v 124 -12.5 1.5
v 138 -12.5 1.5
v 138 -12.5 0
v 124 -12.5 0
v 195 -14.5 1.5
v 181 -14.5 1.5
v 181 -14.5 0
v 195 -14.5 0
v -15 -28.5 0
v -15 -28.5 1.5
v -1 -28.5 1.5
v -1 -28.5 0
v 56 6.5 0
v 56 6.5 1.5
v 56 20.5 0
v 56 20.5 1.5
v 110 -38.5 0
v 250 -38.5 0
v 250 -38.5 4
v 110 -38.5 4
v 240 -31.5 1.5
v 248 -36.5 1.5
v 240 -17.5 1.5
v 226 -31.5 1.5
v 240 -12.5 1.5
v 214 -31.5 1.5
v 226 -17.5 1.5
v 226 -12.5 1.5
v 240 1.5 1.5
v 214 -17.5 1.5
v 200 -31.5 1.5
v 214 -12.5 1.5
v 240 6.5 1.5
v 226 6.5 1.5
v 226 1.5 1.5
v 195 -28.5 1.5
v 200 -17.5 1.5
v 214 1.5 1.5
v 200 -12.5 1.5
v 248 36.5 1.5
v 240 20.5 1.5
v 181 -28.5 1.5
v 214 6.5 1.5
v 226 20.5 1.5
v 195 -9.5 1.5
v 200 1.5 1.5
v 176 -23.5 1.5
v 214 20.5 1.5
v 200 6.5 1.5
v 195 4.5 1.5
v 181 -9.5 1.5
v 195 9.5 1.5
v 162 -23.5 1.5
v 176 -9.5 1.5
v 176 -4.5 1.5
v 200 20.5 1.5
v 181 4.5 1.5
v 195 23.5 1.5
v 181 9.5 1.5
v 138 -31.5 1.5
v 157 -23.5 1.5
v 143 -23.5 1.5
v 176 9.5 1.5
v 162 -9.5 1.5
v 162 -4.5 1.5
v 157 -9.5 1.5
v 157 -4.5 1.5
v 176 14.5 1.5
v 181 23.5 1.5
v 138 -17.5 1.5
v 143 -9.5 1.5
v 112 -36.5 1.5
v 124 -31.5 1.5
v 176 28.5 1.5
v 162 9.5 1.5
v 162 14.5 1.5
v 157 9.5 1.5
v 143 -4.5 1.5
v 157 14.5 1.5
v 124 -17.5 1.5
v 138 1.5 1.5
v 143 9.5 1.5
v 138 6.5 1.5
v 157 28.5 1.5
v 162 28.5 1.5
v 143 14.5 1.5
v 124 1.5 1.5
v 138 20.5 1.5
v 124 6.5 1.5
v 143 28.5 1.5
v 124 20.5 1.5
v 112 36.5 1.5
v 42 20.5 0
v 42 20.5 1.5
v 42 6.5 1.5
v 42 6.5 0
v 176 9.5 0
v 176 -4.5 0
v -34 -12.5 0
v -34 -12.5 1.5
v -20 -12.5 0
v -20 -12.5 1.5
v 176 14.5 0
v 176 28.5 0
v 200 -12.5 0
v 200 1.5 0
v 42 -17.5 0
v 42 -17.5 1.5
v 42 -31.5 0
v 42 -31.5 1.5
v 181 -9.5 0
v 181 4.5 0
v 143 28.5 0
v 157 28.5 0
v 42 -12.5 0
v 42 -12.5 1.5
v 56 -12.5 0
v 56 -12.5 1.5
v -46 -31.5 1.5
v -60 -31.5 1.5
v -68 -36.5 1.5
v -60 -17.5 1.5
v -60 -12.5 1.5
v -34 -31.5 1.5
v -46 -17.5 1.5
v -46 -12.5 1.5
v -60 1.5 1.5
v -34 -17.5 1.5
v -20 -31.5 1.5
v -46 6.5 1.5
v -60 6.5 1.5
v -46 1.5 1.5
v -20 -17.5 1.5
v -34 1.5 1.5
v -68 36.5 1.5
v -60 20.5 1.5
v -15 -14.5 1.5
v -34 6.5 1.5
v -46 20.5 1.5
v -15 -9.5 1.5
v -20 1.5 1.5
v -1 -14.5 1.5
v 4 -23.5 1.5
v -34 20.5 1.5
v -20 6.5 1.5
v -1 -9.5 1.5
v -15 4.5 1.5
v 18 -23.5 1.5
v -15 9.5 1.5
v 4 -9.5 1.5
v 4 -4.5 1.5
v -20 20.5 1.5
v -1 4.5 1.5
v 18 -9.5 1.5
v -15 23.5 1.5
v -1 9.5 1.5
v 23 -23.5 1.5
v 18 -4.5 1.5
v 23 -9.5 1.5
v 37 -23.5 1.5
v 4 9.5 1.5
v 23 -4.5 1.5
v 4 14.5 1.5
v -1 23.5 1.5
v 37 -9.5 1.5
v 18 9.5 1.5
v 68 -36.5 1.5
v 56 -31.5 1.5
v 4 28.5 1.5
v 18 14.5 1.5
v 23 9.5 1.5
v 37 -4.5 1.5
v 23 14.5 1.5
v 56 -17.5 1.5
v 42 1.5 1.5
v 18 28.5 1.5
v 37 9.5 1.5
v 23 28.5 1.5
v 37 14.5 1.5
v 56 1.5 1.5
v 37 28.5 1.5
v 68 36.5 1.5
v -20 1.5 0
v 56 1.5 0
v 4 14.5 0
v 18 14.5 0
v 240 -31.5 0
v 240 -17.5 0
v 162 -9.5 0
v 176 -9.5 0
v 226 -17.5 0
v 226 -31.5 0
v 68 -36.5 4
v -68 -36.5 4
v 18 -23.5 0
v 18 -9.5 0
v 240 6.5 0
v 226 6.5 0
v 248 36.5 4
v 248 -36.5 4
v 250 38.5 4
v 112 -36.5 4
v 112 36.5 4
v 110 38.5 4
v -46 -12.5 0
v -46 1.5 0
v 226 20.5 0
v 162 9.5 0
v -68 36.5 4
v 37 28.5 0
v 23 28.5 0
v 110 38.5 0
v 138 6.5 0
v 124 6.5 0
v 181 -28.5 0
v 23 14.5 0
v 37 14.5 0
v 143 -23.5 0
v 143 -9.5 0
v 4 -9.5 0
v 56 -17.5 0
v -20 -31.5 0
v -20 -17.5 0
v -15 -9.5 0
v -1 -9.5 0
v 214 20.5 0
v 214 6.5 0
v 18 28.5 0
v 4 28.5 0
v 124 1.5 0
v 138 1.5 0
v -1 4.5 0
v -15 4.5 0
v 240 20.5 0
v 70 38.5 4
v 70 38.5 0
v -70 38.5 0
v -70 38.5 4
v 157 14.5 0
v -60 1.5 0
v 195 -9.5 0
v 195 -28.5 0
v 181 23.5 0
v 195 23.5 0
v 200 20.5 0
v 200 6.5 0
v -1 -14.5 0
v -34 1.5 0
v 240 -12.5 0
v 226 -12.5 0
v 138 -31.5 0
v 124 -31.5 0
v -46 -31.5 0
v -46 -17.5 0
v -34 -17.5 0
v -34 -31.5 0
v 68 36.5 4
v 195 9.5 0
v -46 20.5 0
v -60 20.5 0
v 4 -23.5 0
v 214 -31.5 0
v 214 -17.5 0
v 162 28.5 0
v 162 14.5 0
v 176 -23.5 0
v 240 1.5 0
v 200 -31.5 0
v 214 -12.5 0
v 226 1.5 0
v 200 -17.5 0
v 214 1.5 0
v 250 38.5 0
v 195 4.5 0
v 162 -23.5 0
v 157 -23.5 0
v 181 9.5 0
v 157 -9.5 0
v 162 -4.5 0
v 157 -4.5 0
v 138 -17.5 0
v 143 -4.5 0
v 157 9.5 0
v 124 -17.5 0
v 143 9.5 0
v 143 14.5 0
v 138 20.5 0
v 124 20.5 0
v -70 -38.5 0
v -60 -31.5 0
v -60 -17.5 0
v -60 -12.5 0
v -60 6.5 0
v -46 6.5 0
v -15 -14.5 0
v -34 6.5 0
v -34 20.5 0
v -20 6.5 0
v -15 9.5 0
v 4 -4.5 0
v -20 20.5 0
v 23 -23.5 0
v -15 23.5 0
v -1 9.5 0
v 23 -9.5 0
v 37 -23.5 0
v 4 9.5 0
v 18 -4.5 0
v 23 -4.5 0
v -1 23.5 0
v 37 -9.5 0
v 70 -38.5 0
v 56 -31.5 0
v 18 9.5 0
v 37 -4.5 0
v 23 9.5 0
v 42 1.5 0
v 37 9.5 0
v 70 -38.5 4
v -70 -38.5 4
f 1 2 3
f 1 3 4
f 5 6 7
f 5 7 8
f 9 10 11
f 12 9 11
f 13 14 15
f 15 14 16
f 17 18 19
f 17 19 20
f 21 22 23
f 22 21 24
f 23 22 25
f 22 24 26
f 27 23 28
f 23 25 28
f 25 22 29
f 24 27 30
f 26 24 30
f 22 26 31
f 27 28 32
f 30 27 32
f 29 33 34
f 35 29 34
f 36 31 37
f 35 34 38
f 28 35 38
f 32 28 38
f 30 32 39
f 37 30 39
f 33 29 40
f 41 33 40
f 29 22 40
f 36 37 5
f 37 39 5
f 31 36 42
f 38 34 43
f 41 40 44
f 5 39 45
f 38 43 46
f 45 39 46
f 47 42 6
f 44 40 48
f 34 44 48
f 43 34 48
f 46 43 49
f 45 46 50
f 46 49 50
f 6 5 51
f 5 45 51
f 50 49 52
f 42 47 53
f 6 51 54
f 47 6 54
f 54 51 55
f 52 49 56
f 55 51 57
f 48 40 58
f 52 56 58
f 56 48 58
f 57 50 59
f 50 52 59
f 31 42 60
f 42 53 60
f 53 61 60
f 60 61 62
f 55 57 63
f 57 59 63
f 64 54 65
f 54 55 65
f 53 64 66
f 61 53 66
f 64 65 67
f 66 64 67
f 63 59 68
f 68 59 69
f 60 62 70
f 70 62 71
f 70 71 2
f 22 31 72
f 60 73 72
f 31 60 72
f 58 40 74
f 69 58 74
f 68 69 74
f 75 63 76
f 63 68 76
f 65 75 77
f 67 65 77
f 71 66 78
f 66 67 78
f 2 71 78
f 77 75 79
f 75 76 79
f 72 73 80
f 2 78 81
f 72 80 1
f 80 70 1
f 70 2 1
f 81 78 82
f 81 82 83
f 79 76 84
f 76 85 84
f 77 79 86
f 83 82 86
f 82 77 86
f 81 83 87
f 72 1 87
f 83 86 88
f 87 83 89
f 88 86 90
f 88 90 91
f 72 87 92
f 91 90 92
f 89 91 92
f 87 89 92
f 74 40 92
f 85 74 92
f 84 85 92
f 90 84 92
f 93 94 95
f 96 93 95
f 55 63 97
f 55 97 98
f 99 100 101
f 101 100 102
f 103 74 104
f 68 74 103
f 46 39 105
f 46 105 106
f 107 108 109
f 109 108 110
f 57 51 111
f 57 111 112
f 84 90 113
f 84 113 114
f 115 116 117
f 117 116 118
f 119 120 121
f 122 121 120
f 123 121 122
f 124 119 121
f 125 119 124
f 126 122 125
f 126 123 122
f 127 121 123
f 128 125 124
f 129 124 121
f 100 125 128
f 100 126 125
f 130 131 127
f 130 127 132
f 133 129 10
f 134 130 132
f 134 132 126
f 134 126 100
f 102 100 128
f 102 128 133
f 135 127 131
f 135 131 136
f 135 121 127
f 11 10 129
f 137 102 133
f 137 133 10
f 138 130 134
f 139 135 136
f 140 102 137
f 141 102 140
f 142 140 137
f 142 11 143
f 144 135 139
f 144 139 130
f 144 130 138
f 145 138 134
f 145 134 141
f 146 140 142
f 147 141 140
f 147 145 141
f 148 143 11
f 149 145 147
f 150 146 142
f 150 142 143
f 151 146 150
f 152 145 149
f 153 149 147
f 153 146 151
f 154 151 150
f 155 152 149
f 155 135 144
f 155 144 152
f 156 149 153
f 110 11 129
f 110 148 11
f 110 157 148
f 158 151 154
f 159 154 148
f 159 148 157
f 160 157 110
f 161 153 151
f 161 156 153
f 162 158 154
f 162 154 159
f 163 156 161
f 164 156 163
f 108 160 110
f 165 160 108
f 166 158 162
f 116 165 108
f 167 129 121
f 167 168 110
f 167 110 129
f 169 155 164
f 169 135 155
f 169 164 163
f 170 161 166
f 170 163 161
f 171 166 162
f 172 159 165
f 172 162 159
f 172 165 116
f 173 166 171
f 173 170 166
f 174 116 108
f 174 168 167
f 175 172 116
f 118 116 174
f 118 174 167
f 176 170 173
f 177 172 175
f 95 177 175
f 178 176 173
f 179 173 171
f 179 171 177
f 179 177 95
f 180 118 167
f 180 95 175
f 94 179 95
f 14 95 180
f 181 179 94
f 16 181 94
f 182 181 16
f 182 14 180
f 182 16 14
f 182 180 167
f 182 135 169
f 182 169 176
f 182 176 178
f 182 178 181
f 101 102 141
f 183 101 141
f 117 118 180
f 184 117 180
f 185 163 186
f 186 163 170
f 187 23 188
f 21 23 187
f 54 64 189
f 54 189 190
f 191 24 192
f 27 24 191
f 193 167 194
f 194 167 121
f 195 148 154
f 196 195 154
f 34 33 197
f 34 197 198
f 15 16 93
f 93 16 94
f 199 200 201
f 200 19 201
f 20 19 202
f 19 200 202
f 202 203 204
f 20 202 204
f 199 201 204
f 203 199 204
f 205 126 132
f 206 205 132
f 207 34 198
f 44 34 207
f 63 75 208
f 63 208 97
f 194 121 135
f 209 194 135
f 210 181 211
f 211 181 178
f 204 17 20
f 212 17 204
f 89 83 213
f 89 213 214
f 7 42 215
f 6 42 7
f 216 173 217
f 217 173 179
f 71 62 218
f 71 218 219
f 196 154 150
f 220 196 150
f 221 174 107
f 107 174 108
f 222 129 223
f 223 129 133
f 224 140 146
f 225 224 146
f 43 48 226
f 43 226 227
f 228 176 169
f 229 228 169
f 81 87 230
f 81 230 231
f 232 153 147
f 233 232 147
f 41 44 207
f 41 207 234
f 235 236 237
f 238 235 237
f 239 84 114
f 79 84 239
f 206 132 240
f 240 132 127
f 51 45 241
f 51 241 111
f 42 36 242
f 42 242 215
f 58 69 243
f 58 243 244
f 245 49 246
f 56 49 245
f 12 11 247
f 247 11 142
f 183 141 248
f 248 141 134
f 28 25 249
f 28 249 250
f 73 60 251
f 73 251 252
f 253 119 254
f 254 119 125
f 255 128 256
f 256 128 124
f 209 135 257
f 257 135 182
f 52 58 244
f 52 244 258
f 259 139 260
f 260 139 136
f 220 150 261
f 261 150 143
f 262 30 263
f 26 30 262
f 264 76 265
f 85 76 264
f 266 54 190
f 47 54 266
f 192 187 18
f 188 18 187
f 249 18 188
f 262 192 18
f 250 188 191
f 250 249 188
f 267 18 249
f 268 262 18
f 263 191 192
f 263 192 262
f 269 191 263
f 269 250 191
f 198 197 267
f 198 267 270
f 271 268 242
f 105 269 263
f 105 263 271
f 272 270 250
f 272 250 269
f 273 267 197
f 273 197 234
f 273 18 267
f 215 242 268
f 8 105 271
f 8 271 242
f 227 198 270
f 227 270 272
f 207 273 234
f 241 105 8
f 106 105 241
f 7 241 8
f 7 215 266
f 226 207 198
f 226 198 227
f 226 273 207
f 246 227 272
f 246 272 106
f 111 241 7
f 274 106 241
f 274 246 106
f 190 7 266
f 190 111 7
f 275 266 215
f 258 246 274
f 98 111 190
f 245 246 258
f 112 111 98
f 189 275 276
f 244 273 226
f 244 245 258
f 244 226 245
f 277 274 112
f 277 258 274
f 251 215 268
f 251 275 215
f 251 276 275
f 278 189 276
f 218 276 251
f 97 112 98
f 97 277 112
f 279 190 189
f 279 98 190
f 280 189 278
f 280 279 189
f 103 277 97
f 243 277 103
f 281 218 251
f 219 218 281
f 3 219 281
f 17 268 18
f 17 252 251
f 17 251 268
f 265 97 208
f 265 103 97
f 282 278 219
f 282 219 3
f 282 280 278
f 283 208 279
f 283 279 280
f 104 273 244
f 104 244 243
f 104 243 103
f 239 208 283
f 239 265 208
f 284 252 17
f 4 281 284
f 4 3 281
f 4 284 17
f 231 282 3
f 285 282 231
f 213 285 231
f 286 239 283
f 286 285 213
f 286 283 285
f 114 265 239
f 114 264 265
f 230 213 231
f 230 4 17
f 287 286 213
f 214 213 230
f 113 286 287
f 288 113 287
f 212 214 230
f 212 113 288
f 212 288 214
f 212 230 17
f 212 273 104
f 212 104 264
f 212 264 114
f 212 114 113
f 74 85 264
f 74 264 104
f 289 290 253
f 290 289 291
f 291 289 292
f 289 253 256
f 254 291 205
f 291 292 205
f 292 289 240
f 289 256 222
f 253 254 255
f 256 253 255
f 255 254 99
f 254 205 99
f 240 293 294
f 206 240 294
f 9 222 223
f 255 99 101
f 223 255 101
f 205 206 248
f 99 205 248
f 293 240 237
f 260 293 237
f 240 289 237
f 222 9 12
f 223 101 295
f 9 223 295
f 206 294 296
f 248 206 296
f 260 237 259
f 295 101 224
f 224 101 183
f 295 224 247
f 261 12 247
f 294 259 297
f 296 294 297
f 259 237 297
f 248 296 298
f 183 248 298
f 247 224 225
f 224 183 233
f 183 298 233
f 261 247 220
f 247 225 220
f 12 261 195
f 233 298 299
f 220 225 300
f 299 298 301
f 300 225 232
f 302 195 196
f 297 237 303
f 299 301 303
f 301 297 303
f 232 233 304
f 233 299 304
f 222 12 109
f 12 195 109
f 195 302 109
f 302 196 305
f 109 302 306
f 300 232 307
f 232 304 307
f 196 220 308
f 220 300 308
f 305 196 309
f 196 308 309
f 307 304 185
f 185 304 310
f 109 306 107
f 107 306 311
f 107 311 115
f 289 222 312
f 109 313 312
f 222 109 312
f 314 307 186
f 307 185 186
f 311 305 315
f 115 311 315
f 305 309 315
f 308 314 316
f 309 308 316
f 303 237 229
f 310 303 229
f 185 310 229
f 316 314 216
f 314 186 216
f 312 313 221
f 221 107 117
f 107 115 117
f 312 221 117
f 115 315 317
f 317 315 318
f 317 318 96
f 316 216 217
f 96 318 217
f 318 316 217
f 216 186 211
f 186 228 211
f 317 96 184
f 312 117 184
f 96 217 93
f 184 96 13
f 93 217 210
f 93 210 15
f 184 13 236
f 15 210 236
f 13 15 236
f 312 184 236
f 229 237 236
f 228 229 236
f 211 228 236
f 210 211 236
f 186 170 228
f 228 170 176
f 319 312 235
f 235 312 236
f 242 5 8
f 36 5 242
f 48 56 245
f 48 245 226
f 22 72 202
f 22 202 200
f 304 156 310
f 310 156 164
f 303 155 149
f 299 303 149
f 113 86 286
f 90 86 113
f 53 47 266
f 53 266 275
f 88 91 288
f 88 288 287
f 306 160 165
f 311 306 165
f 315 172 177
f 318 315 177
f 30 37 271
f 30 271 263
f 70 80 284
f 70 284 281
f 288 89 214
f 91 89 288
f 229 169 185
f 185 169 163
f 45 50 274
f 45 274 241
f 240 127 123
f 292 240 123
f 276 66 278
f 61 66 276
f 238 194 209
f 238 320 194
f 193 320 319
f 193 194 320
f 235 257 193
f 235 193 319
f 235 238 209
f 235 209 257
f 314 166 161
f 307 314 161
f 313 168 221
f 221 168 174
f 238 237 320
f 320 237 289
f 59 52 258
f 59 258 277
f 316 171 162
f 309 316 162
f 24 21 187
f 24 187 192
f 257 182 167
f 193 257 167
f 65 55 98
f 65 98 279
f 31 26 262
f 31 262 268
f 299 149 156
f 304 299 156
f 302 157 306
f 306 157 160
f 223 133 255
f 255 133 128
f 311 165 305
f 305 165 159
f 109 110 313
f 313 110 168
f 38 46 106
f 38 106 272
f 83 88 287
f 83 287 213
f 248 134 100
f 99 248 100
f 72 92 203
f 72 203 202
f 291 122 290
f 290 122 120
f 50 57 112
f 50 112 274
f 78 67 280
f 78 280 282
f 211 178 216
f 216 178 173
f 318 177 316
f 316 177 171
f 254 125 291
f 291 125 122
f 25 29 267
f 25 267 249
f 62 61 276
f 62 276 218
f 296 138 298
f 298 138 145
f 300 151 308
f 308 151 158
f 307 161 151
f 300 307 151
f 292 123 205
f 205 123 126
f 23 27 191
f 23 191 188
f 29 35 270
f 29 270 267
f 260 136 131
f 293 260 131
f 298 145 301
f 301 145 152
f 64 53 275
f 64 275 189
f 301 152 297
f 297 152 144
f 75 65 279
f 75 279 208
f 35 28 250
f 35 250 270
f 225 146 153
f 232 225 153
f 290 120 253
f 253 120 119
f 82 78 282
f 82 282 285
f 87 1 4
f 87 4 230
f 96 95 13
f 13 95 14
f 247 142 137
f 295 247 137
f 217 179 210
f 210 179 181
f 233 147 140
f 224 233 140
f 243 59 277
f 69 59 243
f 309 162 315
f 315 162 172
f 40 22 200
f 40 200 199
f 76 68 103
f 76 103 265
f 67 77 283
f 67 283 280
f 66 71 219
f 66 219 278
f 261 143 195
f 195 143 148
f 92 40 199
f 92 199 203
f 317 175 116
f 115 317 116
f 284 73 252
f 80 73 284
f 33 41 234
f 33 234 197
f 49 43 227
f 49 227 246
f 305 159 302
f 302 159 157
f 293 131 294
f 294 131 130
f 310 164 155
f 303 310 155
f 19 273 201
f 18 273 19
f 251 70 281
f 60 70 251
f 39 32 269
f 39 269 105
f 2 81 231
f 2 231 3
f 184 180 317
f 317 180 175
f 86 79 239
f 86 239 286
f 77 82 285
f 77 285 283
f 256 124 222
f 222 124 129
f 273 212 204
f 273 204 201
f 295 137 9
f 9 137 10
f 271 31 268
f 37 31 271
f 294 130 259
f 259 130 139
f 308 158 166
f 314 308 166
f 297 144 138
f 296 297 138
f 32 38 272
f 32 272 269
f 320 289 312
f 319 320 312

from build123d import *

# Parameters (mm, degrees)
F1_DEPTH = 1.5
F3_DEPTH = 25
F4_DEPTH = 4


# Not quite as in the source:
# - a feature names something its author has since deleted; it is built from what else it names


with BuildPart() as f1:
    # F0 (on Top) → F1 (new body)
    with BuildSketch(Plane.XY):
        Polygon((-9.6456400305, -38.5), (70, -38.5), (70, -5.2260886878), (68, -5.2260886878), (68, -36.5), (-9.6456400305, -36.5), align=None)
        Polygon((-70, -38.5), (-9.6456400305, -38.5), (-9.6456400305, -36.5), (-68, -36.5), (-68, 2.6378679238), (-70, 2.6378679238), align=None)
        Polygon((-70, 38.5), (-70, 2.6378679238), (-68, 2.6378679238), (-68, 36.5), (-20.2697571367, 36.5), (-20.2697571367, 38.5), align=None)
        Polygon((68, -5.2260886878), (70, -5.2260886878), (70, 38.5), (-20.2697571367, 38.5), (-20.2697571367, 36.5), (68, 36.5), align=None)
        Polygon((-68, -36.5), (-9.6456400305, -36.5), (68, -36.5), (68, -5.2260886878), (68, 36.5), (-20.2697571367, 36.5), (-68, 36.5), (-68, 2.6378679238), align=None)
    extrude(amount=F1_DEPTH)

    # F2 (on face) → F3 (cut)
    with BuildSketch(Plane.XY.offset(1.5)):
        Polygon((56, -17.5), (49, -17.5), (42, -17.5), (42, -31.5), (56, -31.5), align=None)
        Polygon((-1, 23.5), (-8, 23.5), (-15, 23.5), (-15, 17.9919603638), (-15, 9.5), (-8, 9.5), (-1, 9.5), (-1, 14.5402538426), align=None)
        Polygon((-1, 4.5), (-8, 4.5), (-15, 4.5), (-15, -1.0080396362), (-15, -9.5), (-8, -9.5), (-1, -9.5), (-1, 0.6484970983), align=None)
        Polygon((-1, -14.5), (-8, -14.5), (-15, -14.5), (-15, -14.8997963805), (-15, -28.5), (-1, -28.5), align=None)
        Polygon((18, 28.5), (11, 28.5), (4, 28.5), (4, 14.5402538426), (4, 14.5), (11, 14.5), (18, 14.5), (18, 19.3217483706), align=None)
        Polygon((18, 9.5), (11, 9.5), (4, 9.5), (4, -4.5), (11, -4.5), (18, -4.5), (18, 0.3217483706), align=None)
        Polygon((18, -9.5), (11, -9.5), (4, -9.5), (4, -23.5), (18, -23.5), (18, -13.5700083736), align=None)
        Polygon((37, -9.5), (30, -9.5), (23, -9.5), (23, -23.5), (37, -23.5), align=None)
        Polygon((56, 1.5), (49, 1.5), (42, 1.5), (42, -12.5), (49, -12.5), (56, -12.5), align=None)
        Polygon((56, 20.5), (49, 20.5), (42, 20.5), (42, 20.1662803835), (42, 6.5), (49, 6.5), (56, 6.5), align=None)
        Polygon((-53, 6.5), (-46, 6.5), (-46, 20.5), (-53, 20.5), (-60, 20.5), (-60, 6.5), align=None)
        Polygon((-46, -17.5), (-53, -17.5), (-60, -17.5), (-60, -31.5), (-46, -31.5), align=None)
        Polygon((-46, 1.5), (-53, 1.5), (-60, 1.5), (-60, -12.5), (-53, -12.5), (-46, -12.5), align=None)
        Polygon((-20, -17.5), (-27, -17.5), (-34, -17.5), (-34, -31.5), (-20, -31.5), align=None)
        Polygon((-20, 20.5), (-27, 20.5), (-34, 20.5), (-34, 6.5), (-27, 6.5), (-20, 6.5), (-20, 17.9919603638), align=None)
        Polygon((-20, 1.5), (-27, 1.5), (-34, 1.5), (-34, -12.5), (-27, -12.5), (-20, -12.5), (-20, -1.0080396362), align=None)
        Polygon((37, 28.5), (30, 28.5), (23, 28.5), (23, 19.3217483706), (23, 14.5), (30, 14.5), (37, 14.5), (37, 20.1662803835), align=None)
        Polygon((37, 9.5), (30, 9.5), (23, 9.5), (23, 0.3217483706), (23, -4.5), (30, -4.5), (37, -4.5), (37, 6.2745236393), align=None)
    extrude(amount=-F3_DEPTH, mode=Mode.SUBTRACT)

    # F0 (on Top) → F4 (join)
    with BuildSketch(Plane.XY):
        Polygon((-9.6456400305, -38.5), (70, -38.5), (70, -5.2260886878), (68, -5.2260886878), (68, -36.5), (-9.6456400305, -36.5), align=None)
        Polygon((-70, -38.5), (-9.6456400305, -38.5), (-9.6456400305, -36.5), (-68, -36.5), (-68, 2.6378679238), (-70, 2.6378679238), align=None)
        Polygon((68, -5.2260886878), (70, -5.2260886878), (70, 38.5), (-20.2697571367, 38.5), (-20.2697571367, 36.5), (68, 36.5), align=None)
        Polygon((-70, 38.5), (-70, 2.6378679238), (-68, 2.6378679238), (-68, 36.5), (-20.2697571367, 36.5), (-20.2697571367, 38.5), align=None)
    extrude(amount=F4_DEPTH)


with BuildPart() as f6_1:
    # F6: instance of F1
    add(f1.part.mirror(Plane.YZ.offset(90)))


solid = Compound([f1.part, f6_1.part])
